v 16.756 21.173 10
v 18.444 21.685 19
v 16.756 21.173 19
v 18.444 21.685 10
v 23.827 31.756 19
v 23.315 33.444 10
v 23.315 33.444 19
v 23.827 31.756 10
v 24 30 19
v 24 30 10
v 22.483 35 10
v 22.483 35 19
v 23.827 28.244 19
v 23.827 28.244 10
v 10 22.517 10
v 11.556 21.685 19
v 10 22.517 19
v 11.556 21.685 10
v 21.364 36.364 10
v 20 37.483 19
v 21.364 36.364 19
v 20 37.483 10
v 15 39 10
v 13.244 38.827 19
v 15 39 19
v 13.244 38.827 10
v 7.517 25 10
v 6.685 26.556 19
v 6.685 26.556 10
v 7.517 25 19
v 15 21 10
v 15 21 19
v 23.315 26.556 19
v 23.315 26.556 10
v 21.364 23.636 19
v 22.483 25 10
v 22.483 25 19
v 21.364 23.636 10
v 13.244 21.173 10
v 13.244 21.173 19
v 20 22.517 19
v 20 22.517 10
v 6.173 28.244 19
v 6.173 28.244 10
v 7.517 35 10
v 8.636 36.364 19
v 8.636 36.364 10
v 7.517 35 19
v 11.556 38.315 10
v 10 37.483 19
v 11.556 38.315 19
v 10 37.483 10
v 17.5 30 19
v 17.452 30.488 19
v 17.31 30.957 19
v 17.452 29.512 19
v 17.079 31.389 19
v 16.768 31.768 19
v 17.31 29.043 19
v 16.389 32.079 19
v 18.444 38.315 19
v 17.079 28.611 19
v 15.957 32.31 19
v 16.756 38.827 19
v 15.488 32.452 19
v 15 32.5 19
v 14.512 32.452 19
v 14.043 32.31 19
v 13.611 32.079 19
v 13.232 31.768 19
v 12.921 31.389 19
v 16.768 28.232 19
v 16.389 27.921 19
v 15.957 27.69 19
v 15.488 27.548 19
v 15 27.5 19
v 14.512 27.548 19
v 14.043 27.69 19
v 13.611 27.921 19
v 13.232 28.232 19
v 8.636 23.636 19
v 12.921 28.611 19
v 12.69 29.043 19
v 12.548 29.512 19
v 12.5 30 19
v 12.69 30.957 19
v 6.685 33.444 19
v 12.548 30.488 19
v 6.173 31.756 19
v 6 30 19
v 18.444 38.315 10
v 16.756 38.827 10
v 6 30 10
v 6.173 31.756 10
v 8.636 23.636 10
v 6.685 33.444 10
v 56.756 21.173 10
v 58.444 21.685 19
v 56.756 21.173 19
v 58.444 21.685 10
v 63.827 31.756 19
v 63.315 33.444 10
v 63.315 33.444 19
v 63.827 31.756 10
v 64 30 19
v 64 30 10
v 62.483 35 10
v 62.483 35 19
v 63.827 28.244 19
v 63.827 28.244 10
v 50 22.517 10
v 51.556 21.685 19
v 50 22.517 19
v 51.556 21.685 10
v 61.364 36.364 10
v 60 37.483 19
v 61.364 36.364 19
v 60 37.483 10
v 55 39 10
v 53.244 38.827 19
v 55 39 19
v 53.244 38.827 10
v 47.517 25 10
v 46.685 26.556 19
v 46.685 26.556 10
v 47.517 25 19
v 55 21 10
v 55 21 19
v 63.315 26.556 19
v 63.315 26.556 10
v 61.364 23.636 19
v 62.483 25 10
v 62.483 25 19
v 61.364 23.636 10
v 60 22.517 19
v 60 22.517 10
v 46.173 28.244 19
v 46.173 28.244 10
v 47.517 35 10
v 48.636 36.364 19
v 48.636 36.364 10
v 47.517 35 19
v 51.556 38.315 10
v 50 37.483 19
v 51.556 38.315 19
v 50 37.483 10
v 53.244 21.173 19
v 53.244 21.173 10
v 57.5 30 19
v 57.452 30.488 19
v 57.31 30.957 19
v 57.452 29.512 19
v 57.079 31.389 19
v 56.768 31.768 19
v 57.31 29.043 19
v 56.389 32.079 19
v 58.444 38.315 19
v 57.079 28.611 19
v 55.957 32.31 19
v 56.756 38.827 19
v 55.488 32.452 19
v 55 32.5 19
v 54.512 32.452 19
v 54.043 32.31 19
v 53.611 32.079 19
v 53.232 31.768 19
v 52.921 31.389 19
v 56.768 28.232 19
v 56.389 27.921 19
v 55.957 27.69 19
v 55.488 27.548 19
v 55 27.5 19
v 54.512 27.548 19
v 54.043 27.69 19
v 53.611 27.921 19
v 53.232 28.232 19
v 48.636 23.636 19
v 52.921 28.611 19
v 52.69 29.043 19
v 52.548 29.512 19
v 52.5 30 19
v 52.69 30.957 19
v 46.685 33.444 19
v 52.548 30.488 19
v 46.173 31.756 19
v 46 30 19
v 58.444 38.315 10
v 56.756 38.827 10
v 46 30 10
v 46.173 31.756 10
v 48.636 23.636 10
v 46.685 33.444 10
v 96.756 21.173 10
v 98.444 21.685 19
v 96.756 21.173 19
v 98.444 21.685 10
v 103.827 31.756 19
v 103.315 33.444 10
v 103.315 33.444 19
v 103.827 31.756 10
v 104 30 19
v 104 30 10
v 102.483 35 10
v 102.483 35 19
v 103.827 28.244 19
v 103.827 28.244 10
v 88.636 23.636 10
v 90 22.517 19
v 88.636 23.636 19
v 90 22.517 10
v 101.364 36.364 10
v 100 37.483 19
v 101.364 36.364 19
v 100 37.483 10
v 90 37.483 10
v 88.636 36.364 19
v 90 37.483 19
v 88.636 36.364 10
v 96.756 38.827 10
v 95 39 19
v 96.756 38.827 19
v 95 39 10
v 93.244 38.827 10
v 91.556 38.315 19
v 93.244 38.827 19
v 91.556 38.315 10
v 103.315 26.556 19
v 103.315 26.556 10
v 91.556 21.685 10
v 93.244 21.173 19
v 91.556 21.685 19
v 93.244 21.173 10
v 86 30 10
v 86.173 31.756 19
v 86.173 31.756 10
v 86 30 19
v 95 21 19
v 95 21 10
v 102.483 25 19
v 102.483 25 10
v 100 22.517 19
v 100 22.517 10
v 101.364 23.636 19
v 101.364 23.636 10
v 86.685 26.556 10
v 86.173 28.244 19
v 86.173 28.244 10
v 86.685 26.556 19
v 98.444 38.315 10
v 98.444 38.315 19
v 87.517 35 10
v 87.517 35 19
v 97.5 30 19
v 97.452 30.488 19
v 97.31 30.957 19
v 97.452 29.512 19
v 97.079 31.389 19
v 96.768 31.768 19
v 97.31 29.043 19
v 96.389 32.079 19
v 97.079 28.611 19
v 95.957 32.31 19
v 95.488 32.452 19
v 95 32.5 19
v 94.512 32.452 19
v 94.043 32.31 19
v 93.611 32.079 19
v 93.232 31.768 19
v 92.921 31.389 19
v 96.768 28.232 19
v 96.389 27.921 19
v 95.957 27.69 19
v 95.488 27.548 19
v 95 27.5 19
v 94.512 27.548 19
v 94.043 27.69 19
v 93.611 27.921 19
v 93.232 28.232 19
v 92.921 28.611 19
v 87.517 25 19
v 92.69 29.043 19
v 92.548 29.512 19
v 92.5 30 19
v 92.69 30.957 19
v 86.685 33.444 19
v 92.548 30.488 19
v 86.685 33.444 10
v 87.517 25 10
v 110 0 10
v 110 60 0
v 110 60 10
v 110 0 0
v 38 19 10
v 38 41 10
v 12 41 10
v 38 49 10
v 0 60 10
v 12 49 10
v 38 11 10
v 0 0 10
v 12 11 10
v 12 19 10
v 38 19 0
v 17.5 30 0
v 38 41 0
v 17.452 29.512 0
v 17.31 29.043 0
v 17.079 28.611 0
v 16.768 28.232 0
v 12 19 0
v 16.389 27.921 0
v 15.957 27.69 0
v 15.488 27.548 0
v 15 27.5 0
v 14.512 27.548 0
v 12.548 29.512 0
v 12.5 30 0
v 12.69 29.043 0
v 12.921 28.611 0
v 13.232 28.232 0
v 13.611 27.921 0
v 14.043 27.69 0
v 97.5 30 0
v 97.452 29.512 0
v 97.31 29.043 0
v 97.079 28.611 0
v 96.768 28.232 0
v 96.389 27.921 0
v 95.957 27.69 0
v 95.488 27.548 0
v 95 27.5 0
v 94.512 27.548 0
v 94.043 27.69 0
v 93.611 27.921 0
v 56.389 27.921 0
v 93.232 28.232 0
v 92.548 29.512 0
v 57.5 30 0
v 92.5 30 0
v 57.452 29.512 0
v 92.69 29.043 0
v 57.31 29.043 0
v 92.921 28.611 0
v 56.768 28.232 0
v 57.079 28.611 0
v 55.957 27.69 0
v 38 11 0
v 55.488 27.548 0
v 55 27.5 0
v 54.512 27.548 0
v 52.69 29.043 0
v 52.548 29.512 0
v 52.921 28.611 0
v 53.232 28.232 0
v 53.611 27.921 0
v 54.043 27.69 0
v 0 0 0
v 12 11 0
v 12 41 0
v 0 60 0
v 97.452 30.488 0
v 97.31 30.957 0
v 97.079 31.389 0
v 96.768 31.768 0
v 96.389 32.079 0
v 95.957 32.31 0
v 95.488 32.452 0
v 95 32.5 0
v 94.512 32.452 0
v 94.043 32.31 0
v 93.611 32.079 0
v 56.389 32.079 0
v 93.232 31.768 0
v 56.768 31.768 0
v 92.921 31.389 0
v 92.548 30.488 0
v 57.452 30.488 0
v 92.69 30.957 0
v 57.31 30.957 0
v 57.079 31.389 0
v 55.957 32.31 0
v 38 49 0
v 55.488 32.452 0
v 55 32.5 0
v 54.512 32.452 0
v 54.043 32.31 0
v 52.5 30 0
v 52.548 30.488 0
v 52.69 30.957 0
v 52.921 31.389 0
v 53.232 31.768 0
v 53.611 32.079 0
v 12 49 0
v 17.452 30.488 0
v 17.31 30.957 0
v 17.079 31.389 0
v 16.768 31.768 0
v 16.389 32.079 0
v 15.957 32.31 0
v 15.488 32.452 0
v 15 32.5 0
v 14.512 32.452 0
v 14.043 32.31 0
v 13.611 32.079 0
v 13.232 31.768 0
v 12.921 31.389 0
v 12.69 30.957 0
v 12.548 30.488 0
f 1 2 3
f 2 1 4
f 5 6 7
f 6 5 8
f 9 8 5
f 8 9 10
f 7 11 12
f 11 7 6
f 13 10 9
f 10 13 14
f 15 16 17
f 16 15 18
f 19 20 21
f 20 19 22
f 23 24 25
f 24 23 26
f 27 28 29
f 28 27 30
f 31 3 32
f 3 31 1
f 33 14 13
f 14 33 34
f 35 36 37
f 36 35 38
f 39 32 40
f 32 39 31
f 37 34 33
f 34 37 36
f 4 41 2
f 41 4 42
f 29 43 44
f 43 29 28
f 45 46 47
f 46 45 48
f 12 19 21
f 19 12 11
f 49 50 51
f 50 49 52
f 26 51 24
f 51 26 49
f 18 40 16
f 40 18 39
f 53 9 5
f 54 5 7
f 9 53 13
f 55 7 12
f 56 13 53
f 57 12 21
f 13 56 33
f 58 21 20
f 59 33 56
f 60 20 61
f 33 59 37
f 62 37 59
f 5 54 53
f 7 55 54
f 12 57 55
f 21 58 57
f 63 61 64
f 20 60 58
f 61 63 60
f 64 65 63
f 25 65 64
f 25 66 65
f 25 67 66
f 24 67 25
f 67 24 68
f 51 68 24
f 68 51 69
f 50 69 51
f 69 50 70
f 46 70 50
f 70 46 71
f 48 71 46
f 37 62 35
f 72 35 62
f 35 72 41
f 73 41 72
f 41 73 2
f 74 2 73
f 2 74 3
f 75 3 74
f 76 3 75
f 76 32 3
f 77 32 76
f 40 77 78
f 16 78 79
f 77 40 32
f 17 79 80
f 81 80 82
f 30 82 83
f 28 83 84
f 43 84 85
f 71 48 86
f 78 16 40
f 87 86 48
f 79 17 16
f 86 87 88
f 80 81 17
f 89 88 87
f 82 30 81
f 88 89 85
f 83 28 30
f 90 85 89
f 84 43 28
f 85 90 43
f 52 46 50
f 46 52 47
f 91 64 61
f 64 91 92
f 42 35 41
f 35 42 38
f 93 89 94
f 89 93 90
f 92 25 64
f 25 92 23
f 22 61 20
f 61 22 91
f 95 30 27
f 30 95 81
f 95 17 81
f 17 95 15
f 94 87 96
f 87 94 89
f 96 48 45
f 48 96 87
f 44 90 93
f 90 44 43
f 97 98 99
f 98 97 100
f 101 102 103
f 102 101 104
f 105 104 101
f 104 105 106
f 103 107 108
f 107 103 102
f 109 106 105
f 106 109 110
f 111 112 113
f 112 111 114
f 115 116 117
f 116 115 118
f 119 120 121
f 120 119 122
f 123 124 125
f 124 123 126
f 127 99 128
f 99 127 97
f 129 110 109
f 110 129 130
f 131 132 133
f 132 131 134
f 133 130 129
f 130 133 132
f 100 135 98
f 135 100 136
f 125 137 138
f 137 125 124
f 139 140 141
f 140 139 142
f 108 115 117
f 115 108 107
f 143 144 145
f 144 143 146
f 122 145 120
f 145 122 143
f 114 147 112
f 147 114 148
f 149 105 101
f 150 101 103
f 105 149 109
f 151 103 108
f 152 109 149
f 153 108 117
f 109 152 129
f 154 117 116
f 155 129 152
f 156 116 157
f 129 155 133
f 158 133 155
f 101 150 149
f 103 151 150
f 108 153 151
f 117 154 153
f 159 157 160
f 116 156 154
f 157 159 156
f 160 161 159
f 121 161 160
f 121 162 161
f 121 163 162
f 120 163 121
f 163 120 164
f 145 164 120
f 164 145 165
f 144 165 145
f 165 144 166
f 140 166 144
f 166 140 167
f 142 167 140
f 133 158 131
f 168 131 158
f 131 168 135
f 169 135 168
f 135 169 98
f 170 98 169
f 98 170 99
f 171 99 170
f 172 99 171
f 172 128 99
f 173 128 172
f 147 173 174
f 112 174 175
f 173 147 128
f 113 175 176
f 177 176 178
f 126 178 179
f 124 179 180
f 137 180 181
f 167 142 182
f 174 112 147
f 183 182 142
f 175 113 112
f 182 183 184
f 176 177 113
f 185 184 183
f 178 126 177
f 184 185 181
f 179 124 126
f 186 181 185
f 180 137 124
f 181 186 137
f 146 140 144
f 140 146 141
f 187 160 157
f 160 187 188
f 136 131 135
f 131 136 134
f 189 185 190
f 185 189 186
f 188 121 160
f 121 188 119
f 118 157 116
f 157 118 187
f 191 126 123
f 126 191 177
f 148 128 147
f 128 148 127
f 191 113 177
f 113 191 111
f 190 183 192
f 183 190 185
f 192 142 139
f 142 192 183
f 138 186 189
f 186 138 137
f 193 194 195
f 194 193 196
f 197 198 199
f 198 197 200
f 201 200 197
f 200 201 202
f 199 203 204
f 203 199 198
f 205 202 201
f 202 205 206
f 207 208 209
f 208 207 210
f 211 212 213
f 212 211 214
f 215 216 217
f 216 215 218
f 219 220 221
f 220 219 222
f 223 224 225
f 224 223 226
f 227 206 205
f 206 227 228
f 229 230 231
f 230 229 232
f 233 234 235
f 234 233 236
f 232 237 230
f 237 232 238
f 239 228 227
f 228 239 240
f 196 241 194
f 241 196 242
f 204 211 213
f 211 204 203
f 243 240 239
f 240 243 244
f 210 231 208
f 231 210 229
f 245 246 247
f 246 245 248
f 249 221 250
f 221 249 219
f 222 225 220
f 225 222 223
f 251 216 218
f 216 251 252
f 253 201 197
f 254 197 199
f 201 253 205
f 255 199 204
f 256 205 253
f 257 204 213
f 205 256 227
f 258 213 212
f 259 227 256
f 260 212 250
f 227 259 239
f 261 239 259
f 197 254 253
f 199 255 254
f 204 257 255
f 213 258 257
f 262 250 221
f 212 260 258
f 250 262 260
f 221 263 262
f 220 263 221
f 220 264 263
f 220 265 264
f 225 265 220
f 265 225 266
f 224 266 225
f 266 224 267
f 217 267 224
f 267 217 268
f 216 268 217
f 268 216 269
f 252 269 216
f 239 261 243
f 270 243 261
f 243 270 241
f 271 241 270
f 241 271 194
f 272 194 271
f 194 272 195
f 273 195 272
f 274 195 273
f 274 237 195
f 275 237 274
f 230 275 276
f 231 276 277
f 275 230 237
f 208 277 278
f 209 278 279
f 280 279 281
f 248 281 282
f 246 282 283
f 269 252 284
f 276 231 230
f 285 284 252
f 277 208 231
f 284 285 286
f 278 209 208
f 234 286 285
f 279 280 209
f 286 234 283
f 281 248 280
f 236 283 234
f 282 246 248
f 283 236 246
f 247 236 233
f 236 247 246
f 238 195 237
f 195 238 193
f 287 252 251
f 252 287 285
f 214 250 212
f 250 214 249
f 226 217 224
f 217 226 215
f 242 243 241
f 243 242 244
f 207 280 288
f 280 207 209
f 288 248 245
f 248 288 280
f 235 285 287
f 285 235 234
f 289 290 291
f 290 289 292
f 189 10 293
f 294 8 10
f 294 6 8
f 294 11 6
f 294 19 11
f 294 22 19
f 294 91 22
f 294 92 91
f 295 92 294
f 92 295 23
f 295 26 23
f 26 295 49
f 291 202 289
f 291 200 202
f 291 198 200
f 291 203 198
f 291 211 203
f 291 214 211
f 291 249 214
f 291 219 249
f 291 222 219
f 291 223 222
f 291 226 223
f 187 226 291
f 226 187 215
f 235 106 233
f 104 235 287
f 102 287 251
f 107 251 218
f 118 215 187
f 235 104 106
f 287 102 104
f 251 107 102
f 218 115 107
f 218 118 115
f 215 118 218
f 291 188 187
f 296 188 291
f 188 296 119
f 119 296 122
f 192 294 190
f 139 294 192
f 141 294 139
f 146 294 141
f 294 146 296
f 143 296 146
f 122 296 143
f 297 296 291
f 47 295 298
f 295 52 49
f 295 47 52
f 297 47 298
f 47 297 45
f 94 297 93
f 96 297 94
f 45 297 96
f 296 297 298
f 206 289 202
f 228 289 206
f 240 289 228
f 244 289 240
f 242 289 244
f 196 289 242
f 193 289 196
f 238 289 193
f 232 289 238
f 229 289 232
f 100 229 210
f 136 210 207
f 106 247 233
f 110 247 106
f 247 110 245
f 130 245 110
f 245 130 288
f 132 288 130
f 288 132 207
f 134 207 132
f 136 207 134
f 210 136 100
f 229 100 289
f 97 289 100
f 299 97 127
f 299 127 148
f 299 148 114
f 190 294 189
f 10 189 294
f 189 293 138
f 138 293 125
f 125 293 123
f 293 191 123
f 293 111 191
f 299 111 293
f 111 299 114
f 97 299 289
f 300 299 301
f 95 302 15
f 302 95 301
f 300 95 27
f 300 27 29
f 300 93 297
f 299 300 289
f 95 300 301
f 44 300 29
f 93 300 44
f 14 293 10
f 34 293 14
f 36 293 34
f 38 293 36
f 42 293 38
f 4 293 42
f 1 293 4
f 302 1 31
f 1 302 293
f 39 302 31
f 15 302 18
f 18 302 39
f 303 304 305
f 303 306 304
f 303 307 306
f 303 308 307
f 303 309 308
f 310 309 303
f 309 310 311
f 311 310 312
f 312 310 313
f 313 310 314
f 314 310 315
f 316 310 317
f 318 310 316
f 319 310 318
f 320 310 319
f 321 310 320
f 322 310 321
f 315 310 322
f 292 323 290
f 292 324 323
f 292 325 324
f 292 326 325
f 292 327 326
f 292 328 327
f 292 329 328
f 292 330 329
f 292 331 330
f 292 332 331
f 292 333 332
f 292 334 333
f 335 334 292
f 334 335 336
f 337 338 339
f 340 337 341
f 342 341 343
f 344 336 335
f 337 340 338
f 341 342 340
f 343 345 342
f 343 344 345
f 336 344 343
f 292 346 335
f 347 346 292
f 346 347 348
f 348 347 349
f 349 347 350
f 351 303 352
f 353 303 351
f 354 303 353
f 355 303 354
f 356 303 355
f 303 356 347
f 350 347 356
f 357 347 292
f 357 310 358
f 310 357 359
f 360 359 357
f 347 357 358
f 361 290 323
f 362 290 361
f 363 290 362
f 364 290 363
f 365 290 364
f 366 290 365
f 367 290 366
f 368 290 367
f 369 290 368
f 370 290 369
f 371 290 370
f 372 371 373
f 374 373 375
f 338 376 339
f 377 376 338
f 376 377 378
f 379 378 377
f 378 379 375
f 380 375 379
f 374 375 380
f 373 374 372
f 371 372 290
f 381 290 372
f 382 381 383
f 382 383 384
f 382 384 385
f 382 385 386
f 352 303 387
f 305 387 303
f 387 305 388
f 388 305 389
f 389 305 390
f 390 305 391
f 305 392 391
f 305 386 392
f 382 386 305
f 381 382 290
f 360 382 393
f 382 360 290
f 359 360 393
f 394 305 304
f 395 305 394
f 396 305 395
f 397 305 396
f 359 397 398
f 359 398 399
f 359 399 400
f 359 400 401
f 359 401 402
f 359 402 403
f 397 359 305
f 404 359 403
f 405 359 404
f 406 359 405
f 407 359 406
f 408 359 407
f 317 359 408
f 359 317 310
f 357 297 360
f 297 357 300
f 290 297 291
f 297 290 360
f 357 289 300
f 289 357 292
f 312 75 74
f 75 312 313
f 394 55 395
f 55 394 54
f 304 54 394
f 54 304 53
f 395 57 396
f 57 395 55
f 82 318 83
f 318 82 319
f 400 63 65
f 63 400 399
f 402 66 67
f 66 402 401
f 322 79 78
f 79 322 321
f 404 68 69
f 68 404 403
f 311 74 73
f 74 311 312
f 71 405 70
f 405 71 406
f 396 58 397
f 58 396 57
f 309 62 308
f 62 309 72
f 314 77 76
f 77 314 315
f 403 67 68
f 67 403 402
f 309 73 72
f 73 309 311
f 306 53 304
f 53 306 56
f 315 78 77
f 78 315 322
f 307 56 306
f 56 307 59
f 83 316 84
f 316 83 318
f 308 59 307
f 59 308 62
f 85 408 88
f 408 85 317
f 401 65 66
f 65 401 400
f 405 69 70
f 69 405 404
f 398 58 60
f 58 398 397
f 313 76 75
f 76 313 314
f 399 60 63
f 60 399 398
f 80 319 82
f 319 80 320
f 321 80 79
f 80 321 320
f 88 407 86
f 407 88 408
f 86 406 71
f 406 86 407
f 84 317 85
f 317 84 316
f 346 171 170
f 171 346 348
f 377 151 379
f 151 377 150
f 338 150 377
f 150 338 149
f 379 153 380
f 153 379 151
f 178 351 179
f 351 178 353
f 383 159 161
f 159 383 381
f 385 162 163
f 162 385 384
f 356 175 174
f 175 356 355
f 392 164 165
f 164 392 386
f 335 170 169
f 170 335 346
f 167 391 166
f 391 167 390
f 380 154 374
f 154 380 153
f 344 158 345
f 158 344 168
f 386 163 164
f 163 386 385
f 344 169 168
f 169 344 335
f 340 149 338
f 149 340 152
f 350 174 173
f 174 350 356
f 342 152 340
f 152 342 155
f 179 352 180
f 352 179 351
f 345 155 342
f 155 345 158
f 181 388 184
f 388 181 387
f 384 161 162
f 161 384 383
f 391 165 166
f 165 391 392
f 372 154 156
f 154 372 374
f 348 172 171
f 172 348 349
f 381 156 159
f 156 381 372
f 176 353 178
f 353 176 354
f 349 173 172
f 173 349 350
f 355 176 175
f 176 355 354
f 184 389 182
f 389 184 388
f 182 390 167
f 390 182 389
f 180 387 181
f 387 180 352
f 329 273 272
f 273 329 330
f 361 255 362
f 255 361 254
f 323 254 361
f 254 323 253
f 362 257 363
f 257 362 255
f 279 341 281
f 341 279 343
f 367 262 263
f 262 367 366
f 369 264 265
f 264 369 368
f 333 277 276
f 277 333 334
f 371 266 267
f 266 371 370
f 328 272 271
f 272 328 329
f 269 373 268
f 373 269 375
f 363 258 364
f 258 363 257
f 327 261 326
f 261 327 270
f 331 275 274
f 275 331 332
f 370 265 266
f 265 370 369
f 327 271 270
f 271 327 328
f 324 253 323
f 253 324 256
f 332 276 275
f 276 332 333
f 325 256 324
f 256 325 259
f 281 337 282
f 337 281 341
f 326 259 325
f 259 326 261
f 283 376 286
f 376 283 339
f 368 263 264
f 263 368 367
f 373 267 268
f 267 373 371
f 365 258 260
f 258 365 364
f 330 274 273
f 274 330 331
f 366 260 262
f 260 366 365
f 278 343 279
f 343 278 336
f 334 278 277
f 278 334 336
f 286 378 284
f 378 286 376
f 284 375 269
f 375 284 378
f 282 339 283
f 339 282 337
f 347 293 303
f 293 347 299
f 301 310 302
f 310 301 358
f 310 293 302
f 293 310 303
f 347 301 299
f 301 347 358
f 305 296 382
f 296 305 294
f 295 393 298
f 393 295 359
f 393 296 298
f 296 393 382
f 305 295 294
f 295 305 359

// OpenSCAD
$fn = 32;

// ----------------------------------------------------------------------
// Drill jig: three_boss_slot jig
// ----------------------------------------------------------------------

// --- parameters (mm) ---
plate_l = 110;            // plate length, X
plate_w = 60;             // plate width, Y
plate_t = 10;             // plate thickness
boss_d = 18;              // guide boss diameter
boss_h = 10;              // boss height above the plate
guide_d = 5;              // guide hole diameter
boss_pitch = 40;          // boss pitch
slot_w = 8;               // clamp slot width
slot_l = 26;              // clamp slot length
slot_x = 12;              // slot start X

n_boss = 3;  // guide bosses
boss_x0 = (plate_l - (n_boss - 1) * boss_pitch) / 2;  // first boss X
boss_top = plate_t - 1 + boss_h;  // boss crown height
total_h = boss_top;  // overall height

difference() {
  union() {
  cube([plate_l, plate_w, plate_t]);
  for (i = [0 : n_boss - 1])
    translate([boss_x0 + i * boss_pitch, plate_w / 2, plate_t - 1])
      cylinder(h = boss_h, d = boss_d);
  }
  for (i = [0 : n_boss - 1])
    translate([boss_x0 + i * boss_pitch, plate_w / 2, -1])
      cylinder(h = plate_t + boss_h, d = guide_d);
  for (cy = [plate_w * 0.25, plate_w * 0.75])
    translate([slot_x, cy - slot_w / 2, -1])
      cube([slot_l, slot_w, plate_t + 2]);
}
